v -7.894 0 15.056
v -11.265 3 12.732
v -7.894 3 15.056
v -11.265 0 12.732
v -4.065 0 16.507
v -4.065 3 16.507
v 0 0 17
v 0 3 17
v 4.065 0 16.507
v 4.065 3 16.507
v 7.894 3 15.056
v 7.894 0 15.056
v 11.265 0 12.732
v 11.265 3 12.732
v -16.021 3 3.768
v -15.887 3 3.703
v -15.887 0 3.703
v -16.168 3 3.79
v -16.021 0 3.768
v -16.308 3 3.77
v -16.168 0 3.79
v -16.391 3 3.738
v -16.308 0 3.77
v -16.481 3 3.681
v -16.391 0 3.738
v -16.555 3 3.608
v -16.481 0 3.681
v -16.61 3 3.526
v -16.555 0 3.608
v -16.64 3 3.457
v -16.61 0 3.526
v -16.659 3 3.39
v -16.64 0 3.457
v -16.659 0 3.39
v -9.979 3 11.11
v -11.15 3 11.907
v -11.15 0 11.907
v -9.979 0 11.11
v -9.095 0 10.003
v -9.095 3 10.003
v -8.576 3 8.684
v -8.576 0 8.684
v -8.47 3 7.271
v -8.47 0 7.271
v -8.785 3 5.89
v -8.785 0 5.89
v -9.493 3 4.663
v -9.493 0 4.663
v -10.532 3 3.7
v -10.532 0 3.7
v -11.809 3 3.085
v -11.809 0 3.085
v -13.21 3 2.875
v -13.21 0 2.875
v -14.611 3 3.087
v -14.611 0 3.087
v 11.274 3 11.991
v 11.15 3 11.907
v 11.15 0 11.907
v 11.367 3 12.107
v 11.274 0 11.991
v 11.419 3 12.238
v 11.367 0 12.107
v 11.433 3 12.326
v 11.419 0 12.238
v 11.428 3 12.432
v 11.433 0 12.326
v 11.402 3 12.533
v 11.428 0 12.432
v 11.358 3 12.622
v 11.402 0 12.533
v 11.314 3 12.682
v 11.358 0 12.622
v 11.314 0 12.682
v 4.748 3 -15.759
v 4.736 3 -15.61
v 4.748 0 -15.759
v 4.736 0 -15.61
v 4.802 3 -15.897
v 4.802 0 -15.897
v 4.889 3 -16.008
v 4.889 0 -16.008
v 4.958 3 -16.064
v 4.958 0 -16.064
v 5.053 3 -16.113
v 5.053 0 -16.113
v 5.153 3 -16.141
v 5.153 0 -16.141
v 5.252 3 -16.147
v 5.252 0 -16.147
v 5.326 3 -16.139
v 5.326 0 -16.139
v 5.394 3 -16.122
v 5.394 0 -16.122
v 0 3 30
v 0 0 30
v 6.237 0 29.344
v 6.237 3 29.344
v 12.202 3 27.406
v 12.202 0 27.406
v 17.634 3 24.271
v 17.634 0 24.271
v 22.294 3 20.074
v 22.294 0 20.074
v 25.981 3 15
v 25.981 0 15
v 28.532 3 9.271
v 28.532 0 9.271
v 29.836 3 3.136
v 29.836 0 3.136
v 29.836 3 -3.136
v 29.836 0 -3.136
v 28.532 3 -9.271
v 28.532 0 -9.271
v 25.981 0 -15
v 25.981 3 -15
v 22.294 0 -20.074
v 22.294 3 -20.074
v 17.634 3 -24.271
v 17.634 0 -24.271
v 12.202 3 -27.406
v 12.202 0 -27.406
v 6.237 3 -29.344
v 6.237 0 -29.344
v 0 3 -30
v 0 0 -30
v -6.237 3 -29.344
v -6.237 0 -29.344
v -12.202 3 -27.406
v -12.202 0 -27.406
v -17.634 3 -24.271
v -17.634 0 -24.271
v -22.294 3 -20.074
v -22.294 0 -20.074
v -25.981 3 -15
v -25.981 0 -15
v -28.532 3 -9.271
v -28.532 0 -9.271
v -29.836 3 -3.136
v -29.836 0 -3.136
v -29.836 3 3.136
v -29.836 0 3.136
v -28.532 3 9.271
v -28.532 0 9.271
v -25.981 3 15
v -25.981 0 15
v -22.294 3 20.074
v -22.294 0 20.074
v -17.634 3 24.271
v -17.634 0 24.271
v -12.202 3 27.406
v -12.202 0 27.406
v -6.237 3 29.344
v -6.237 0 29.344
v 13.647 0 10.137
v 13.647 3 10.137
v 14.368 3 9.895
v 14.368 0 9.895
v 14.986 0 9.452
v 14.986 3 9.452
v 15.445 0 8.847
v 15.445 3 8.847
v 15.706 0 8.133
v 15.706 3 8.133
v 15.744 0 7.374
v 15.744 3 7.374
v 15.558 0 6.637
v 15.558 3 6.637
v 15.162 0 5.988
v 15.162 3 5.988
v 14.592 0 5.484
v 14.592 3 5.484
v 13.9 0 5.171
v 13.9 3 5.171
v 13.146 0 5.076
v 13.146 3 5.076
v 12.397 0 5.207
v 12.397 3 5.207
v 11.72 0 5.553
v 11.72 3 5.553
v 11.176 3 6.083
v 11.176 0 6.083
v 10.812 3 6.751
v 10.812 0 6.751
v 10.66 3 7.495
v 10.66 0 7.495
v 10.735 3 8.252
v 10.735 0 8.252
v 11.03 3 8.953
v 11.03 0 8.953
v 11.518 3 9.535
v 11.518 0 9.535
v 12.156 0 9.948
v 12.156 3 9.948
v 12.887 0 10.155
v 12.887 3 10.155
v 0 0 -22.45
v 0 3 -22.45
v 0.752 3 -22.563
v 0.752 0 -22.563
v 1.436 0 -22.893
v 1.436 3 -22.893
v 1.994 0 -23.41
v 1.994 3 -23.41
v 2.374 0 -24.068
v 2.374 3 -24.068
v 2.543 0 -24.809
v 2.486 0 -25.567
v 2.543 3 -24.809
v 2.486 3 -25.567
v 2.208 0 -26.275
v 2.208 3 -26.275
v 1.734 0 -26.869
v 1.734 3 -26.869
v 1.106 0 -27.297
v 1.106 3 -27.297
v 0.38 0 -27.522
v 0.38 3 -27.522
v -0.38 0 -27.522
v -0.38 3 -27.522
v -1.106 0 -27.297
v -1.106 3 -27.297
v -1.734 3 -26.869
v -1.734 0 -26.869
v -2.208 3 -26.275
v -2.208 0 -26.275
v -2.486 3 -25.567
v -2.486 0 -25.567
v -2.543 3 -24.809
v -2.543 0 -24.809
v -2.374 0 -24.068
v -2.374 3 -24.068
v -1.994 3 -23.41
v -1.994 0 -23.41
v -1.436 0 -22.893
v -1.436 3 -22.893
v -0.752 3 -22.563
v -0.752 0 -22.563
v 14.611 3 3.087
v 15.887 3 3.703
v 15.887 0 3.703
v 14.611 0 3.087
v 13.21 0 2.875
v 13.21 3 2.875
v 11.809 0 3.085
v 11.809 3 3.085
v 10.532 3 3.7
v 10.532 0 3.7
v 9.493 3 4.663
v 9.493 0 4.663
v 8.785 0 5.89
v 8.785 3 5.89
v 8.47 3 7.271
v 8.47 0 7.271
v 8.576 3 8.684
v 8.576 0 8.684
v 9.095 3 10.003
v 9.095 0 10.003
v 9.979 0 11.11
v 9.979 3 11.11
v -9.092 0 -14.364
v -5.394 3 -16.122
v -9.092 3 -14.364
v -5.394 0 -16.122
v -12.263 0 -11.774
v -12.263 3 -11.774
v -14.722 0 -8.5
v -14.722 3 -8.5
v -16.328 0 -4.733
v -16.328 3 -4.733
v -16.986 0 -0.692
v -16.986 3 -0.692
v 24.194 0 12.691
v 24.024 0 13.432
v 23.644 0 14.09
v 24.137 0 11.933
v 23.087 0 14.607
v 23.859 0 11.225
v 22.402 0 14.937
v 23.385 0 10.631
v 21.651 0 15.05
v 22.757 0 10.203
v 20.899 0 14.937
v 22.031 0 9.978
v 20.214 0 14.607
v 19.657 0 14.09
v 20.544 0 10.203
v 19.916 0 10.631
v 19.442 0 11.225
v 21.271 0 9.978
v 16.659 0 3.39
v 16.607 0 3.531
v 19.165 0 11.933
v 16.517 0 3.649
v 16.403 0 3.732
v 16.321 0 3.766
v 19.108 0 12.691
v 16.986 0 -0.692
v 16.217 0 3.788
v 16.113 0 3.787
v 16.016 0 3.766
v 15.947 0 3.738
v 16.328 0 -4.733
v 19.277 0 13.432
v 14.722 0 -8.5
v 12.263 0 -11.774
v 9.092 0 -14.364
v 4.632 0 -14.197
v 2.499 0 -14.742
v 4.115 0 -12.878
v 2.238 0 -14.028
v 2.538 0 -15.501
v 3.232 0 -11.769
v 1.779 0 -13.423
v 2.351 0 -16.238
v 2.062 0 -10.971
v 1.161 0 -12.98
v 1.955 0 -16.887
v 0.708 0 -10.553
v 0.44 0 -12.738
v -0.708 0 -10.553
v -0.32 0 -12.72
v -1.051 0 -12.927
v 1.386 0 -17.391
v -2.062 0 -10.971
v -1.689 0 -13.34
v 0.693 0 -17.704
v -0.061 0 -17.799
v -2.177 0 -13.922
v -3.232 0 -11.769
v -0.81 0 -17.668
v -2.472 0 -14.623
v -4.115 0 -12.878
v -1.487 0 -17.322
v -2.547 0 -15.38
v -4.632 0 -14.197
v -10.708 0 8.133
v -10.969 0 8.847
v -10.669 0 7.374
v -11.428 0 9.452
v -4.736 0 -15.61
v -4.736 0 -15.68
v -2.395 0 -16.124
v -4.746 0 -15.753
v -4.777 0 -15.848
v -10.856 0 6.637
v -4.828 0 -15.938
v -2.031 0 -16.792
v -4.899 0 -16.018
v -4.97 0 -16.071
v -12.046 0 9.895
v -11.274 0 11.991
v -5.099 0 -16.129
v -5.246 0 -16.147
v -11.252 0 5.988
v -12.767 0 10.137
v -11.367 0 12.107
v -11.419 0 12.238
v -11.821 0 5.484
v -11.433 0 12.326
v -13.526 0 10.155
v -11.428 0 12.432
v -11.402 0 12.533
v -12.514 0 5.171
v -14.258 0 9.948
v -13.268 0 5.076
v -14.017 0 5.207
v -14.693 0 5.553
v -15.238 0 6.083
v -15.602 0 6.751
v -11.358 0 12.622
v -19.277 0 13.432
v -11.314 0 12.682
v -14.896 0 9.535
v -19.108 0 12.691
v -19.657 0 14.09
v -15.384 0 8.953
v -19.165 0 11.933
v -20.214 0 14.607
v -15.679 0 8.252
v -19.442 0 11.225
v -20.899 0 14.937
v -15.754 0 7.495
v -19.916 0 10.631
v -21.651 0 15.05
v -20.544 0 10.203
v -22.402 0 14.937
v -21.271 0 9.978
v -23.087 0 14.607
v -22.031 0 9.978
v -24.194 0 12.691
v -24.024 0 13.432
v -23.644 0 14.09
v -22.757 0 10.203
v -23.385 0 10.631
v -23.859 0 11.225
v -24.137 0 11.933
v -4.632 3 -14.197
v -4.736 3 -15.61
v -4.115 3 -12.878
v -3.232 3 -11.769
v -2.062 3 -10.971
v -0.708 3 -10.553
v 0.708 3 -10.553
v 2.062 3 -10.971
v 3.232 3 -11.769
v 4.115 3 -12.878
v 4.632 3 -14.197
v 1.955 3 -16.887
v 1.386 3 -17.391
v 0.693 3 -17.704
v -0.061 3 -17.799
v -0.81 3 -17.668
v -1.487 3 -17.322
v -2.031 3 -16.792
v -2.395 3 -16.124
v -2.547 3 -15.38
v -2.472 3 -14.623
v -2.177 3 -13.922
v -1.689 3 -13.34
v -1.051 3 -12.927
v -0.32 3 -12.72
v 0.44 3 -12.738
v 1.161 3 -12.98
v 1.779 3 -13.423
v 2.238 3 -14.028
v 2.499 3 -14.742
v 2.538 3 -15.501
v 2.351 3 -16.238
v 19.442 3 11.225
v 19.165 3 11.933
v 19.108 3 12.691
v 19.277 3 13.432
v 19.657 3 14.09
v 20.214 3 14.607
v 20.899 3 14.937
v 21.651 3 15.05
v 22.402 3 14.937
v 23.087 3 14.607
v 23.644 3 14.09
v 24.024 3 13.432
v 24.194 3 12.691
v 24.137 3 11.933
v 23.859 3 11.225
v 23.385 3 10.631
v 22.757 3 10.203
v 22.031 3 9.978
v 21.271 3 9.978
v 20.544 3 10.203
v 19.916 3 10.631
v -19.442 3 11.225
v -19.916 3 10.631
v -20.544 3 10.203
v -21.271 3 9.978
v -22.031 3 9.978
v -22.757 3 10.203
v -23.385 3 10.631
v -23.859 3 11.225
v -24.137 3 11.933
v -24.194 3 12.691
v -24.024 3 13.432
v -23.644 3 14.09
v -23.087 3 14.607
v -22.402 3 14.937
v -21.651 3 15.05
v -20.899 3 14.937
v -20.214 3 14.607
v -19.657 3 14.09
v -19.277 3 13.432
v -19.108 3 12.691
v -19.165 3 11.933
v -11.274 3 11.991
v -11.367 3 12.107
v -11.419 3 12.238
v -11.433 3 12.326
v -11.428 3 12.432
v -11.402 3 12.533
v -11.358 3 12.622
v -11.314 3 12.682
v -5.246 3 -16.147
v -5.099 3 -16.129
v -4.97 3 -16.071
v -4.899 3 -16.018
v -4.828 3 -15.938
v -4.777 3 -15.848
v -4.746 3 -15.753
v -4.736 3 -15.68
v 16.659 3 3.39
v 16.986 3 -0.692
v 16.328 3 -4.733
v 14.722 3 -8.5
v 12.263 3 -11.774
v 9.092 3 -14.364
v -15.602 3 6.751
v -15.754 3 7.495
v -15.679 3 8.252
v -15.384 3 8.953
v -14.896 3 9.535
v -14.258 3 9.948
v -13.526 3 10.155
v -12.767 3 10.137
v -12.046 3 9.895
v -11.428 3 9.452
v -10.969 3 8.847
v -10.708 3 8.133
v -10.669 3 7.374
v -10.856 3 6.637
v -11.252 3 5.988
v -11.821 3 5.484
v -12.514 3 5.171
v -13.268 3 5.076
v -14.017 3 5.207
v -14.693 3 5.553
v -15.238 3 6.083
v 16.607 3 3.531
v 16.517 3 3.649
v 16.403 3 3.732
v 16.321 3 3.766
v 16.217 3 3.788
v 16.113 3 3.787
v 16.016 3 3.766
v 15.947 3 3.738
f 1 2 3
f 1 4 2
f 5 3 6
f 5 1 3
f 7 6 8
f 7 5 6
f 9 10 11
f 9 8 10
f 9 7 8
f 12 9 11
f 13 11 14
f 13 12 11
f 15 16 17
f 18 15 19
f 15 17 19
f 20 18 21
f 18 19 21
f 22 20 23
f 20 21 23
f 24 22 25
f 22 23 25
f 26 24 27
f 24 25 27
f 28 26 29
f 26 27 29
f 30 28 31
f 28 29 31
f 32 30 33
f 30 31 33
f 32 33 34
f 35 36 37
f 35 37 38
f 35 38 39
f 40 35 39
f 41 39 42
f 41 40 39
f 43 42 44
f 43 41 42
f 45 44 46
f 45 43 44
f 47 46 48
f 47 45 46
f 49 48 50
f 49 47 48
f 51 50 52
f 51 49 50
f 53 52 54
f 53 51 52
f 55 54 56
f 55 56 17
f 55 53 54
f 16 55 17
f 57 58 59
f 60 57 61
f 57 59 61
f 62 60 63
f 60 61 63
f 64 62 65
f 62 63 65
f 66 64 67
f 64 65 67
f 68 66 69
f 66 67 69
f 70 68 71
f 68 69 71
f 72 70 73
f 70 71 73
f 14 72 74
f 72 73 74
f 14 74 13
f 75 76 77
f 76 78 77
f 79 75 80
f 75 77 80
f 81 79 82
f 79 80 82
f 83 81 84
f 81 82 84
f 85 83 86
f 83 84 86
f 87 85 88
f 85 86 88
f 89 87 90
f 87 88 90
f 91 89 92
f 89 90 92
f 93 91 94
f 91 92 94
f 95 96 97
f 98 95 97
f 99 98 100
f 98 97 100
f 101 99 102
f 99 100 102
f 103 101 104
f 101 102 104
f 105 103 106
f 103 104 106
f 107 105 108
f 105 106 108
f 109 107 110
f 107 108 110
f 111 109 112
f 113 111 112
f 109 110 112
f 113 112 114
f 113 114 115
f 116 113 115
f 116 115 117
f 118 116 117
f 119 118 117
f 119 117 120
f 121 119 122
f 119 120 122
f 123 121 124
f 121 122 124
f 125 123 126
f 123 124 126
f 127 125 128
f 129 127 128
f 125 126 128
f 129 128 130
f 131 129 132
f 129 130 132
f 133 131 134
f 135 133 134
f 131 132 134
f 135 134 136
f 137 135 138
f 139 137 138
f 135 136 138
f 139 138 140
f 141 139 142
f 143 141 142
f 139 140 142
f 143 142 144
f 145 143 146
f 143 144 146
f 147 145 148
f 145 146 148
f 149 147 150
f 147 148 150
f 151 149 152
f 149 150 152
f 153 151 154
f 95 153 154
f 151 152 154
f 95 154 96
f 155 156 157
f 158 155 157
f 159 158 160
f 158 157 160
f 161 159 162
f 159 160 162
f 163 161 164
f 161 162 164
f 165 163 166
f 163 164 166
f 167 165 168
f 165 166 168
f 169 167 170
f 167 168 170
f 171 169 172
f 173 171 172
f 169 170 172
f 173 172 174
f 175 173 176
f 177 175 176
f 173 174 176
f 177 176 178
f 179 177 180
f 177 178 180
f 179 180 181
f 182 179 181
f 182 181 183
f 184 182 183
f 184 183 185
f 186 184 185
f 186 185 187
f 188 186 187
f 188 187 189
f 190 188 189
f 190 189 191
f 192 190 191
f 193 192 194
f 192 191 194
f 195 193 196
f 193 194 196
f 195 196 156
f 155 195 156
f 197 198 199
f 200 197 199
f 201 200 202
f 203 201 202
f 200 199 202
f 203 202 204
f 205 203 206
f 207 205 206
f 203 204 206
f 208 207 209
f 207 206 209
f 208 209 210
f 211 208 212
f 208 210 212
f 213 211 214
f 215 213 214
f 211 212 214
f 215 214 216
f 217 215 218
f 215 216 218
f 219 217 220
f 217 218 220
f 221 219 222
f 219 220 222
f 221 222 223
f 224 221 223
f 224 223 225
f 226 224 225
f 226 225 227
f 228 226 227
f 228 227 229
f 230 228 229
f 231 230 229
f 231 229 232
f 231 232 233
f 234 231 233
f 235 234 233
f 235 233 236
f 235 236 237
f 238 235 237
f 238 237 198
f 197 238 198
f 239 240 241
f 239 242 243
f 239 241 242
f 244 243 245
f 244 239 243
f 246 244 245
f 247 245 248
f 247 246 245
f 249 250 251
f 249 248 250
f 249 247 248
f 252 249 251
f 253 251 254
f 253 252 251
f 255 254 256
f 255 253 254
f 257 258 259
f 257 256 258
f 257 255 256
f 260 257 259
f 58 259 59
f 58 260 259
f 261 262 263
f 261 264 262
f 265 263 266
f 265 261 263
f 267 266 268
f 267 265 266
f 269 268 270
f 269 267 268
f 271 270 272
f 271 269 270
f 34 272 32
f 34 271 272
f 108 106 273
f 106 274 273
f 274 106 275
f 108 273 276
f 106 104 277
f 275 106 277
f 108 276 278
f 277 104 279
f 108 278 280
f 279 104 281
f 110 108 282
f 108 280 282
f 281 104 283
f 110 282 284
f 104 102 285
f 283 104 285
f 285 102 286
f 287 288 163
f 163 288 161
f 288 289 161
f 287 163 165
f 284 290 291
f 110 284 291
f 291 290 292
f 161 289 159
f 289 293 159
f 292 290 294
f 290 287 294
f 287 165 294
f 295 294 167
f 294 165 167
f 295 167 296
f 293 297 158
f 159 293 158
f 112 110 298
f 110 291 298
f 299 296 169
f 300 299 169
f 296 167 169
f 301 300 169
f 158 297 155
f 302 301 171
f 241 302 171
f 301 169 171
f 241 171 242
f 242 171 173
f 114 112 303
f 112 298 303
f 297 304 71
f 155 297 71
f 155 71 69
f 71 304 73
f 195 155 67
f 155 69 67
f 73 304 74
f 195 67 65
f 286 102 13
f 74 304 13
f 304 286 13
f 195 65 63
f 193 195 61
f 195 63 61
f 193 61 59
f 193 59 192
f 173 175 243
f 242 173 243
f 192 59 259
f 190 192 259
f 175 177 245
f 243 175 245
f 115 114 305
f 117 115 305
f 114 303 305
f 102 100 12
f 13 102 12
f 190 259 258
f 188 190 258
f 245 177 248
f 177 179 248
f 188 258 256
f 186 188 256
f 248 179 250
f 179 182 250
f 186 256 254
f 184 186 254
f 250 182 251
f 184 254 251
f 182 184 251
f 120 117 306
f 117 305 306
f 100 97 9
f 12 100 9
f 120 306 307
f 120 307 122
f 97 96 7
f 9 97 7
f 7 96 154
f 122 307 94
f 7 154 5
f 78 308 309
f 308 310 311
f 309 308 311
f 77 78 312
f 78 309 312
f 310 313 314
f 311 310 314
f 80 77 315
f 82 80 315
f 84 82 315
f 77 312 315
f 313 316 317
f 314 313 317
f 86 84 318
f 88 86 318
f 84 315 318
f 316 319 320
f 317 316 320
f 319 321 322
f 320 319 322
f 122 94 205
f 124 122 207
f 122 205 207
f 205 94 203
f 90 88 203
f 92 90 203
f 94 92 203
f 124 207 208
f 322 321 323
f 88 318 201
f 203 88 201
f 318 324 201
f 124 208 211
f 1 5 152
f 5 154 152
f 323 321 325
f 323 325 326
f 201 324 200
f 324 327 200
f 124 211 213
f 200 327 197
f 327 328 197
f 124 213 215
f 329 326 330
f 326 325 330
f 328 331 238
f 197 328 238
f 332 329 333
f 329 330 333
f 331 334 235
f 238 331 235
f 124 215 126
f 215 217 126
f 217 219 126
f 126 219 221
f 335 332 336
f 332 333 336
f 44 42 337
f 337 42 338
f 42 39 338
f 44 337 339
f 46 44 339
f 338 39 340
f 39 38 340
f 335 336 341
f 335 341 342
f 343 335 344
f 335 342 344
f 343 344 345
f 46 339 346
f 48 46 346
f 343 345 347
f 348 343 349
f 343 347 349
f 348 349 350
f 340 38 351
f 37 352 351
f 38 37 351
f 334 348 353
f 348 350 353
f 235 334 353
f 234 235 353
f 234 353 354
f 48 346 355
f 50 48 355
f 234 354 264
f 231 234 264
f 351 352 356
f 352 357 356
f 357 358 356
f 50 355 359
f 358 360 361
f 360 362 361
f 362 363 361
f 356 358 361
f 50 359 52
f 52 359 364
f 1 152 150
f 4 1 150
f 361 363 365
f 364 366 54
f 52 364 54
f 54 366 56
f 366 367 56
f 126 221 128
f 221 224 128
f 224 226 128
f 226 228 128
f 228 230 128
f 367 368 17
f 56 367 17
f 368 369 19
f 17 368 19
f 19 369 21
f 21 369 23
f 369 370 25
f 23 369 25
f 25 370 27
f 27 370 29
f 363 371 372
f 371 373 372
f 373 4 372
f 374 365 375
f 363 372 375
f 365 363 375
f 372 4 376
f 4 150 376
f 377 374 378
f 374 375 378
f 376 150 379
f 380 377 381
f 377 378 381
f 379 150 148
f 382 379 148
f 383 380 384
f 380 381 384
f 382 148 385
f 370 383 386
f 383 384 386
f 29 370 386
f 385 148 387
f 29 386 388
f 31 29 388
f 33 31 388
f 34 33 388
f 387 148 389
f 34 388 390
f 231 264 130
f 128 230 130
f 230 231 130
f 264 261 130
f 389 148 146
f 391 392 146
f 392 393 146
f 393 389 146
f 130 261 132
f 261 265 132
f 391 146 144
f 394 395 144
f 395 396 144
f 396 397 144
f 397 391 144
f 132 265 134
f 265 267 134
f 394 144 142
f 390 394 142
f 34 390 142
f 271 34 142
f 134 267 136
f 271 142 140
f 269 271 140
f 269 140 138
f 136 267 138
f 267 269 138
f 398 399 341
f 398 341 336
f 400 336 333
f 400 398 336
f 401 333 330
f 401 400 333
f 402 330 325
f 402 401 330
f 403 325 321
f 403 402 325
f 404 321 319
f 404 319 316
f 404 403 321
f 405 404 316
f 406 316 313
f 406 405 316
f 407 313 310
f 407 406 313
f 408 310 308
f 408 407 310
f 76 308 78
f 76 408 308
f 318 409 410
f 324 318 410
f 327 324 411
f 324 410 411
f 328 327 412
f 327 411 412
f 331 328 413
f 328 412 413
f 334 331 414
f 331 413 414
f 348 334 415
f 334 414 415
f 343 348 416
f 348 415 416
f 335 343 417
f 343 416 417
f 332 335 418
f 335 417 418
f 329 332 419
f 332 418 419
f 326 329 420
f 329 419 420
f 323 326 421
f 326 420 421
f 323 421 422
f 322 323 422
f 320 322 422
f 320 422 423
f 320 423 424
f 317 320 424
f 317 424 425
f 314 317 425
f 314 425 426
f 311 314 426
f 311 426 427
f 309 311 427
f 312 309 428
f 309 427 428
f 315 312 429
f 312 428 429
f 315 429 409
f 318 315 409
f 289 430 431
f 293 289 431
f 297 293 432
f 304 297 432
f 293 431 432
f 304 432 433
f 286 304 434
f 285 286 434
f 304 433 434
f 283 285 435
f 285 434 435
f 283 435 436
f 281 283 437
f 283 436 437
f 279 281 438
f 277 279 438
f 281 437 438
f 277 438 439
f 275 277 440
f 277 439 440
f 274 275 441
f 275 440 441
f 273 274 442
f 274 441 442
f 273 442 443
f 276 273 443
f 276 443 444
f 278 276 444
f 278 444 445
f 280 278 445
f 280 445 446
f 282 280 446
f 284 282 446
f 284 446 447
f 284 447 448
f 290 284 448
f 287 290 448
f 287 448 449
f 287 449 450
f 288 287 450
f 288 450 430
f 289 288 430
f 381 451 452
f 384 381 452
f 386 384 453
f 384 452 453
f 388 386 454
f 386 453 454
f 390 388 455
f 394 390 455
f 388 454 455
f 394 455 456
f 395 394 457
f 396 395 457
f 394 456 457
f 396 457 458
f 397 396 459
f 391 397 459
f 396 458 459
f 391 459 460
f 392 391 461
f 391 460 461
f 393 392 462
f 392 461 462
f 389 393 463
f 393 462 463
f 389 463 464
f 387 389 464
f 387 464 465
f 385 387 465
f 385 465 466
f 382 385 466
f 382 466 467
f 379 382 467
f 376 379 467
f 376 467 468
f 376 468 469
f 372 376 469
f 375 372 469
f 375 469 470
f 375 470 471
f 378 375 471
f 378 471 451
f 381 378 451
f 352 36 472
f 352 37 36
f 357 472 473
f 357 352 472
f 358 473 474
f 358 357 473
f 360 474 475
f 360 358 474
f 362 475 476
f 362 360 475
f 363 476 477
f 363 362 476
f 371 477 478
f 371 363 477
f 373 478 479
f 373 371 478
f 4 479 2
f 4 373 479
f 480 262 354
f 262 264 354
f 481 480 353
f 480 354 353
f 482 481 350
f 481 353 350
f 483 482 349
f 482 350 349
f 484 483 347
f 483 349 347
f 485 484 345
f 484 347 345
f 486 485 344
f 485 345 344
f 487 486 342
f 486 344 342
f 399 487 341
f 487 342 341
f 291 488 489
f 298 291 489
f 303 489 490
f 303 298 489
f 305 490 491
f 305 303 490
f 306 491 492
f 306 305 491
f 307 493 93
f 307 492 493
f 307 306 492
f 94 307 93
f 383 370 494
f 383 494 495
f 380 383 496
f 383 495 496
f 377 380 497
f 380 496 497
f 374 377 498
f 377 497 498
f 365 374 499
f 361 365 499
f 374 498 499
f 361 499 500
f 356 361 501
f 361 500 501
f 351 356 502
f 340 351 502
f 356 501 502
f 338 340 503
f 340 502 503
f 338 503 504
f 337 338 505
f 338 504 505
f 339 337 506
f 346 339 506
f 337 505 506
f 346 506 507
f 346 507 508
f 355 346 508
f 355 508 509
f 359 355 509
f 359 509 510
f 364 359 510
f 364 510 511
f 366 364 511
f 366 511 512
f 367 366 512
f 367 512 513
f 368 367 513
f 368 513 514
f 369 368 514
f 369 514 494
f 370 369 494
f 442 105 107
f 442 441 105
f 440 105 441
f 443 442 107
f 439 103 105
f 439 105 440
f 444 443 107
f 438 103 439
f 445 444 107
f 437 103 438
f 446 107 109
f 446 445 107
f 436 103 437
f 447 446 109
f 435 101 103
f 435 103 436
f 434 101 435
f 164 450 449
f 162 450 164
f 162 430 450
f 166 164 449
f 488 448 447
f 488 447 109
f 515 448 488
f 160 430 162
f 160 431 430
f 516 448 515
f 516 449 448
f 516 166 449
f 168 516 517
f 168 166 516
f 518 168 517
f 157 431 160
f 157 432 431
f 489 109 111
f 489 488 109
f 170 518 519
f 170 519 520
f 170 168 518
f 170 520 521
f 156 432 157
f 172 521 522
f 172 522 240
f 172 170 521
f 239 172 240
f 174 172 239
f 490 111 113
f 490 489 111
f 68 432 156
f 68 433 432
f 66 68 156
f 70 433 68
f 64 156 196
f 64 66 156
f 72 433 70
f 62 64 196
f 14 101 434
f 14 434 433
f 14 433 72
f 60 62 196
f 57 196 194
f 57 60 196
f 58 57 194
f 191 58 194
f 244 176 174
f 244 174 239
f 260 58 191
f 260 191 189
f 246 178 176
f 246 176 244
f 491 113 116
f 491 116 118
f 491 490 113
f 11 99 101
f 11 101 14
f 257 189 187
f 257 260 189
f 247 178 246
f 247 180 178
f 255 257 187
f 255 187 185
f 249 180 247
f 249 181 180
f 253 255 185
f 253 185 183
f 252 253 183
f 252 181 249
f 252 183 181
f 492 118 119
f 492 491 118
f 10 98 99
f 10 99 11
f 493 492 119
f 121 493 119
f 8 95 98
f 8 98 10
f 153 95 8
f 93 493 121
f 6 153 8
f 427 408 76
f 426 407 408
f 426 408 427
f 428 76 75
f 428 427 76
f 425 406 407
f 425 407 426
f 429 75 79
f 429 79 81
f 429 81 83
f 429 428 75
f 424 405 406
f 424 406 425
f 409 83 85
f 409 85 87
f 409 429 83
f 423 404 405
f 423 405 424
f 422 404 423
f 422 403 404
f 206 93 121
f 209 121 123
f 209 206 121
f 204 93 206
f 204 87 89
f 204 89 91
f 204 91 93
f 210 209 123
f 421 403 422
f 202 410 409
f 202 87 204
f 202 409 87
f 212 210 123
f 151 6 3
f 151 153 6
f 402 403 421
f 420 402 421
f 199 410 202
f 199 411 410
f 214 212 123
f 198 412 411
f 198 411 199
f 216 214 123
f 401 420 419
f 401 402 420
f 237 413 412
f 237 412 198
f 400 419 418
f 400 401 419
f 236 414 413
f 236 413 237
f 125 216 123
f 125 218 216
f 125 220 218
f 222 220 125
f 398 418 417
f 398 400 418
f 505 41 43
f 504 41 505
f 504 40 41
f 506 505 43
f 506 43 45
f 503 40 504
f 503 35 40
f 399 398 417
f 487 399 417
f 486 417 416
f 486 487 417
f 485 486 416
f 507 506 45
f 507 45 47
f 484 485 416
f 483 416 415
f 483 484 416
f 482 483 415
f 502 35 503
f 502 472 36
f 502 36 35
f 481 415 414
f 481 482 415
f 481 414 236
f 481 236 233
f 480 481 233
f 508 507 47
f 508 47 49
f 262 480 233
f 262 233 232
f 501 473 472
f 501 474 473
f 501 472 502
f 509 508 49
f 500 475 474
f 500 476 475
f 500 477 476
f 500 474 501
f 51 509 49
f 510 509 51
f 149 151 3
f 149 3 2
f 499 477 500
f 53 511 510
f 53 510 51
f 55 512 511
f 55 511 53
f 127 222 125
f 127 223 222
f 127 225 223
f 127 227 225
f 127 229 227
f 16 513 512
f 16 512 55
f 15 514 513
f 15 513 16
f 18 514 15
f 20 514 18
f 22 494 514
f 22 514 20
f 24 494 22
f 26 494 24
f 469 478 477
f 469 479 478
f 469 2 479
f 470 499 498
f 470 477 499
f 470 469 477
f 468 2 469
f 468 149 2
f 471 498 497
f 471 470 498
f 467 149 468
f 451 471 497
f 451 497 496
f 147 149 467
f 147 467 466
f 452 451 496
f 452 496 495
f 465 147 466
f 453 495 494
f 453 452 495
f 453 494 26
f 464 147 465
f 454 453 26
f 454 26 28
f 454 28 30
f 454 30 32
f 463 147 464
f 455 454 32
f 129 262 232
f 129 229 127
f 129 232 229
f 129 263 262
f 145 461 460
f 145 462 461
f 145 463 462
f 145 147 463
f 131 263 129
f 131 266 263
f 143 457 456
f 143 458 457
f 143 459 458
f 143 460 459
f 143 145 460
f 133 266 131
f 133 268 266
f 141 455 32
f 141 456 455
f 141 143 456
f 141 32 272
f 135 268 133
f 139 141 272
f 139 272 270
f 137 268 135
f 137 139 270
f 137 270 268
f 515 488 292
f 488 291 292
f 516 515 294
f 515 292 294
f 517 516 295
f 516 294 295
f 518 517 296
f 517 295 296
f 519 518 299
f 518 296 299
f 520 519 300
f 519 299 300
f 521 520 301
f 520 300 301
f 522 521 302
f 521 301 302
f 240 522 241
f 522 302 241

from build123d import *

# Parameters (mm, degrees)
SKETCH1_R           = 30
SKETCH1_R_2         = 17
BOSS_EXTRUDE1_DEPTH = 3
SKETCH2_R           = 4.75
SKETCH2_R_2         = 2.55
BOSS_EXTRUDE2_DEPTH = 3
SKETCH3_R           = 2.55
CUT_EXTRUDE1_DEPTH  = 43.532340636
CIRPATTERN1_COUNT   = 3
FILLET1_R           = 0.5
SKETCH4_R           = 2.55
CUT_EXTRUDE2_DEPTH  = 43.532340784
CIRPATTERN2_COUNT   = 3


with BuildPart() as part:
    # Sketch1 → Boss-Extrude1 (new body)
    with BuildSketch(Plane(origin=(0, 0, 0), x_dir=(1, 0, 0), z_dir=(0, 1, 0))):
        with Locations(Location((0, 0, 0), (0, 0, 270))):
            Circle(SKETCH1_R)
        with Locations(Location((0, 0, 0), (0, 0, 270))):
            Circle(SKETCH1_R_2, mode=Mode.SUBTRACT)
    extrude(amount=BOSS_EXTRUDE1_DEPTH)

    # Sketch2 → Boss-Extrude2 (add)
    with BuildSketch(Plane(origin=(0, 3, 0), x_dir=(1, 0, 0), z_dir=(0, 1, 0))):
        with Locations((0, 15.25)):
            Circle(SKETCH2_R)
        with Locations((0, 15.25)):
            Circle(SKETCH2_R_2, mode=Mode.SUBTRACT)
    boss_extrude2 = extrude(amount=-BOSS_EXTRUDE2_DEPTH)

    # Sketch3 → Cut-Extrude1 (cut, through all)
    with BuildSketch(Plane(origin=(0, 3, 0), x_dir=(1, 0, 0), z_dir=(0, 1, 0))):
        with Locations(Location((0, 15.25, 0), (0, 0, 270))):
            Circle(SKETCH3_R)
    cut_extrude1 = extrude(amount=-CUT_EXTRUDE1_DEPTH, mode=Mode.SUBTRACT)

    # CirPattern1: Boss-Extrude2, Cut-Extrude1 ×3 about axis
    cirpattern1_axis = Axis((0, 0, 0), (0, 1, 0))
    add([boss_extrude2.rotate(cirpattern1_axis, i * 360 / CIRPATTERN1_COUNT) for i in range(1, CIRPATTERN1_COUNT)])
    add([cut_extrude1.rotate(cirpattern1_axis, i * 360 / CIRPATTERN1_COUNT) for i in range(1, CIRPATTERN1_COUNT)], mode=Mode.SUBTRACT)

    # Fillet1
    fillet1_edges = [part.edges().sort_by_distance(p)[0] for p in [
        (-4.618326952, 1.5, -16.360655738),
        (4.618326952, 1.5, -16.360655738),
        (16.477906967, 1.5, 4.180739406),
        (11.859580016, 1.5, 12.179916332),
        (-16.477906967, 1.5, 4.180739406),
        (-11.859580016, 1.5, 12.179916332),
    ]]
    fillet(fillet1_edges, radius=FILLET1_R)

    # Sketch4 → Cut-Extrude2 (cut, through all)
    with BuildSketch(Plane(origin=(0, 3, 0), x_dir=(1, 0, 0), z_dir=(0, 1, 0))):
        with Locations(Location((0, 25, 0), (0, 0, 270))):
            Circle(SKETCH4_R)
    cut_extrude2 = extrude(amount=-CUT_EXTRUDE2_DEPTH, mode=Mode.SUBTRACT)

    # CirPattern2: Cut-Extrude2 ×3 about axis
    cirpattern2_axis = Axis((0, 0, 0), (0, 1, 0))
    for i in range(1, CIRPATTERN2_COUNT):
        add(cut_extrude2.rotate(cirpattern2_axis, i * 360 / CIRPATTERN2_COUNT), mode=Mode.SUBTRACT)


solid = part.part
